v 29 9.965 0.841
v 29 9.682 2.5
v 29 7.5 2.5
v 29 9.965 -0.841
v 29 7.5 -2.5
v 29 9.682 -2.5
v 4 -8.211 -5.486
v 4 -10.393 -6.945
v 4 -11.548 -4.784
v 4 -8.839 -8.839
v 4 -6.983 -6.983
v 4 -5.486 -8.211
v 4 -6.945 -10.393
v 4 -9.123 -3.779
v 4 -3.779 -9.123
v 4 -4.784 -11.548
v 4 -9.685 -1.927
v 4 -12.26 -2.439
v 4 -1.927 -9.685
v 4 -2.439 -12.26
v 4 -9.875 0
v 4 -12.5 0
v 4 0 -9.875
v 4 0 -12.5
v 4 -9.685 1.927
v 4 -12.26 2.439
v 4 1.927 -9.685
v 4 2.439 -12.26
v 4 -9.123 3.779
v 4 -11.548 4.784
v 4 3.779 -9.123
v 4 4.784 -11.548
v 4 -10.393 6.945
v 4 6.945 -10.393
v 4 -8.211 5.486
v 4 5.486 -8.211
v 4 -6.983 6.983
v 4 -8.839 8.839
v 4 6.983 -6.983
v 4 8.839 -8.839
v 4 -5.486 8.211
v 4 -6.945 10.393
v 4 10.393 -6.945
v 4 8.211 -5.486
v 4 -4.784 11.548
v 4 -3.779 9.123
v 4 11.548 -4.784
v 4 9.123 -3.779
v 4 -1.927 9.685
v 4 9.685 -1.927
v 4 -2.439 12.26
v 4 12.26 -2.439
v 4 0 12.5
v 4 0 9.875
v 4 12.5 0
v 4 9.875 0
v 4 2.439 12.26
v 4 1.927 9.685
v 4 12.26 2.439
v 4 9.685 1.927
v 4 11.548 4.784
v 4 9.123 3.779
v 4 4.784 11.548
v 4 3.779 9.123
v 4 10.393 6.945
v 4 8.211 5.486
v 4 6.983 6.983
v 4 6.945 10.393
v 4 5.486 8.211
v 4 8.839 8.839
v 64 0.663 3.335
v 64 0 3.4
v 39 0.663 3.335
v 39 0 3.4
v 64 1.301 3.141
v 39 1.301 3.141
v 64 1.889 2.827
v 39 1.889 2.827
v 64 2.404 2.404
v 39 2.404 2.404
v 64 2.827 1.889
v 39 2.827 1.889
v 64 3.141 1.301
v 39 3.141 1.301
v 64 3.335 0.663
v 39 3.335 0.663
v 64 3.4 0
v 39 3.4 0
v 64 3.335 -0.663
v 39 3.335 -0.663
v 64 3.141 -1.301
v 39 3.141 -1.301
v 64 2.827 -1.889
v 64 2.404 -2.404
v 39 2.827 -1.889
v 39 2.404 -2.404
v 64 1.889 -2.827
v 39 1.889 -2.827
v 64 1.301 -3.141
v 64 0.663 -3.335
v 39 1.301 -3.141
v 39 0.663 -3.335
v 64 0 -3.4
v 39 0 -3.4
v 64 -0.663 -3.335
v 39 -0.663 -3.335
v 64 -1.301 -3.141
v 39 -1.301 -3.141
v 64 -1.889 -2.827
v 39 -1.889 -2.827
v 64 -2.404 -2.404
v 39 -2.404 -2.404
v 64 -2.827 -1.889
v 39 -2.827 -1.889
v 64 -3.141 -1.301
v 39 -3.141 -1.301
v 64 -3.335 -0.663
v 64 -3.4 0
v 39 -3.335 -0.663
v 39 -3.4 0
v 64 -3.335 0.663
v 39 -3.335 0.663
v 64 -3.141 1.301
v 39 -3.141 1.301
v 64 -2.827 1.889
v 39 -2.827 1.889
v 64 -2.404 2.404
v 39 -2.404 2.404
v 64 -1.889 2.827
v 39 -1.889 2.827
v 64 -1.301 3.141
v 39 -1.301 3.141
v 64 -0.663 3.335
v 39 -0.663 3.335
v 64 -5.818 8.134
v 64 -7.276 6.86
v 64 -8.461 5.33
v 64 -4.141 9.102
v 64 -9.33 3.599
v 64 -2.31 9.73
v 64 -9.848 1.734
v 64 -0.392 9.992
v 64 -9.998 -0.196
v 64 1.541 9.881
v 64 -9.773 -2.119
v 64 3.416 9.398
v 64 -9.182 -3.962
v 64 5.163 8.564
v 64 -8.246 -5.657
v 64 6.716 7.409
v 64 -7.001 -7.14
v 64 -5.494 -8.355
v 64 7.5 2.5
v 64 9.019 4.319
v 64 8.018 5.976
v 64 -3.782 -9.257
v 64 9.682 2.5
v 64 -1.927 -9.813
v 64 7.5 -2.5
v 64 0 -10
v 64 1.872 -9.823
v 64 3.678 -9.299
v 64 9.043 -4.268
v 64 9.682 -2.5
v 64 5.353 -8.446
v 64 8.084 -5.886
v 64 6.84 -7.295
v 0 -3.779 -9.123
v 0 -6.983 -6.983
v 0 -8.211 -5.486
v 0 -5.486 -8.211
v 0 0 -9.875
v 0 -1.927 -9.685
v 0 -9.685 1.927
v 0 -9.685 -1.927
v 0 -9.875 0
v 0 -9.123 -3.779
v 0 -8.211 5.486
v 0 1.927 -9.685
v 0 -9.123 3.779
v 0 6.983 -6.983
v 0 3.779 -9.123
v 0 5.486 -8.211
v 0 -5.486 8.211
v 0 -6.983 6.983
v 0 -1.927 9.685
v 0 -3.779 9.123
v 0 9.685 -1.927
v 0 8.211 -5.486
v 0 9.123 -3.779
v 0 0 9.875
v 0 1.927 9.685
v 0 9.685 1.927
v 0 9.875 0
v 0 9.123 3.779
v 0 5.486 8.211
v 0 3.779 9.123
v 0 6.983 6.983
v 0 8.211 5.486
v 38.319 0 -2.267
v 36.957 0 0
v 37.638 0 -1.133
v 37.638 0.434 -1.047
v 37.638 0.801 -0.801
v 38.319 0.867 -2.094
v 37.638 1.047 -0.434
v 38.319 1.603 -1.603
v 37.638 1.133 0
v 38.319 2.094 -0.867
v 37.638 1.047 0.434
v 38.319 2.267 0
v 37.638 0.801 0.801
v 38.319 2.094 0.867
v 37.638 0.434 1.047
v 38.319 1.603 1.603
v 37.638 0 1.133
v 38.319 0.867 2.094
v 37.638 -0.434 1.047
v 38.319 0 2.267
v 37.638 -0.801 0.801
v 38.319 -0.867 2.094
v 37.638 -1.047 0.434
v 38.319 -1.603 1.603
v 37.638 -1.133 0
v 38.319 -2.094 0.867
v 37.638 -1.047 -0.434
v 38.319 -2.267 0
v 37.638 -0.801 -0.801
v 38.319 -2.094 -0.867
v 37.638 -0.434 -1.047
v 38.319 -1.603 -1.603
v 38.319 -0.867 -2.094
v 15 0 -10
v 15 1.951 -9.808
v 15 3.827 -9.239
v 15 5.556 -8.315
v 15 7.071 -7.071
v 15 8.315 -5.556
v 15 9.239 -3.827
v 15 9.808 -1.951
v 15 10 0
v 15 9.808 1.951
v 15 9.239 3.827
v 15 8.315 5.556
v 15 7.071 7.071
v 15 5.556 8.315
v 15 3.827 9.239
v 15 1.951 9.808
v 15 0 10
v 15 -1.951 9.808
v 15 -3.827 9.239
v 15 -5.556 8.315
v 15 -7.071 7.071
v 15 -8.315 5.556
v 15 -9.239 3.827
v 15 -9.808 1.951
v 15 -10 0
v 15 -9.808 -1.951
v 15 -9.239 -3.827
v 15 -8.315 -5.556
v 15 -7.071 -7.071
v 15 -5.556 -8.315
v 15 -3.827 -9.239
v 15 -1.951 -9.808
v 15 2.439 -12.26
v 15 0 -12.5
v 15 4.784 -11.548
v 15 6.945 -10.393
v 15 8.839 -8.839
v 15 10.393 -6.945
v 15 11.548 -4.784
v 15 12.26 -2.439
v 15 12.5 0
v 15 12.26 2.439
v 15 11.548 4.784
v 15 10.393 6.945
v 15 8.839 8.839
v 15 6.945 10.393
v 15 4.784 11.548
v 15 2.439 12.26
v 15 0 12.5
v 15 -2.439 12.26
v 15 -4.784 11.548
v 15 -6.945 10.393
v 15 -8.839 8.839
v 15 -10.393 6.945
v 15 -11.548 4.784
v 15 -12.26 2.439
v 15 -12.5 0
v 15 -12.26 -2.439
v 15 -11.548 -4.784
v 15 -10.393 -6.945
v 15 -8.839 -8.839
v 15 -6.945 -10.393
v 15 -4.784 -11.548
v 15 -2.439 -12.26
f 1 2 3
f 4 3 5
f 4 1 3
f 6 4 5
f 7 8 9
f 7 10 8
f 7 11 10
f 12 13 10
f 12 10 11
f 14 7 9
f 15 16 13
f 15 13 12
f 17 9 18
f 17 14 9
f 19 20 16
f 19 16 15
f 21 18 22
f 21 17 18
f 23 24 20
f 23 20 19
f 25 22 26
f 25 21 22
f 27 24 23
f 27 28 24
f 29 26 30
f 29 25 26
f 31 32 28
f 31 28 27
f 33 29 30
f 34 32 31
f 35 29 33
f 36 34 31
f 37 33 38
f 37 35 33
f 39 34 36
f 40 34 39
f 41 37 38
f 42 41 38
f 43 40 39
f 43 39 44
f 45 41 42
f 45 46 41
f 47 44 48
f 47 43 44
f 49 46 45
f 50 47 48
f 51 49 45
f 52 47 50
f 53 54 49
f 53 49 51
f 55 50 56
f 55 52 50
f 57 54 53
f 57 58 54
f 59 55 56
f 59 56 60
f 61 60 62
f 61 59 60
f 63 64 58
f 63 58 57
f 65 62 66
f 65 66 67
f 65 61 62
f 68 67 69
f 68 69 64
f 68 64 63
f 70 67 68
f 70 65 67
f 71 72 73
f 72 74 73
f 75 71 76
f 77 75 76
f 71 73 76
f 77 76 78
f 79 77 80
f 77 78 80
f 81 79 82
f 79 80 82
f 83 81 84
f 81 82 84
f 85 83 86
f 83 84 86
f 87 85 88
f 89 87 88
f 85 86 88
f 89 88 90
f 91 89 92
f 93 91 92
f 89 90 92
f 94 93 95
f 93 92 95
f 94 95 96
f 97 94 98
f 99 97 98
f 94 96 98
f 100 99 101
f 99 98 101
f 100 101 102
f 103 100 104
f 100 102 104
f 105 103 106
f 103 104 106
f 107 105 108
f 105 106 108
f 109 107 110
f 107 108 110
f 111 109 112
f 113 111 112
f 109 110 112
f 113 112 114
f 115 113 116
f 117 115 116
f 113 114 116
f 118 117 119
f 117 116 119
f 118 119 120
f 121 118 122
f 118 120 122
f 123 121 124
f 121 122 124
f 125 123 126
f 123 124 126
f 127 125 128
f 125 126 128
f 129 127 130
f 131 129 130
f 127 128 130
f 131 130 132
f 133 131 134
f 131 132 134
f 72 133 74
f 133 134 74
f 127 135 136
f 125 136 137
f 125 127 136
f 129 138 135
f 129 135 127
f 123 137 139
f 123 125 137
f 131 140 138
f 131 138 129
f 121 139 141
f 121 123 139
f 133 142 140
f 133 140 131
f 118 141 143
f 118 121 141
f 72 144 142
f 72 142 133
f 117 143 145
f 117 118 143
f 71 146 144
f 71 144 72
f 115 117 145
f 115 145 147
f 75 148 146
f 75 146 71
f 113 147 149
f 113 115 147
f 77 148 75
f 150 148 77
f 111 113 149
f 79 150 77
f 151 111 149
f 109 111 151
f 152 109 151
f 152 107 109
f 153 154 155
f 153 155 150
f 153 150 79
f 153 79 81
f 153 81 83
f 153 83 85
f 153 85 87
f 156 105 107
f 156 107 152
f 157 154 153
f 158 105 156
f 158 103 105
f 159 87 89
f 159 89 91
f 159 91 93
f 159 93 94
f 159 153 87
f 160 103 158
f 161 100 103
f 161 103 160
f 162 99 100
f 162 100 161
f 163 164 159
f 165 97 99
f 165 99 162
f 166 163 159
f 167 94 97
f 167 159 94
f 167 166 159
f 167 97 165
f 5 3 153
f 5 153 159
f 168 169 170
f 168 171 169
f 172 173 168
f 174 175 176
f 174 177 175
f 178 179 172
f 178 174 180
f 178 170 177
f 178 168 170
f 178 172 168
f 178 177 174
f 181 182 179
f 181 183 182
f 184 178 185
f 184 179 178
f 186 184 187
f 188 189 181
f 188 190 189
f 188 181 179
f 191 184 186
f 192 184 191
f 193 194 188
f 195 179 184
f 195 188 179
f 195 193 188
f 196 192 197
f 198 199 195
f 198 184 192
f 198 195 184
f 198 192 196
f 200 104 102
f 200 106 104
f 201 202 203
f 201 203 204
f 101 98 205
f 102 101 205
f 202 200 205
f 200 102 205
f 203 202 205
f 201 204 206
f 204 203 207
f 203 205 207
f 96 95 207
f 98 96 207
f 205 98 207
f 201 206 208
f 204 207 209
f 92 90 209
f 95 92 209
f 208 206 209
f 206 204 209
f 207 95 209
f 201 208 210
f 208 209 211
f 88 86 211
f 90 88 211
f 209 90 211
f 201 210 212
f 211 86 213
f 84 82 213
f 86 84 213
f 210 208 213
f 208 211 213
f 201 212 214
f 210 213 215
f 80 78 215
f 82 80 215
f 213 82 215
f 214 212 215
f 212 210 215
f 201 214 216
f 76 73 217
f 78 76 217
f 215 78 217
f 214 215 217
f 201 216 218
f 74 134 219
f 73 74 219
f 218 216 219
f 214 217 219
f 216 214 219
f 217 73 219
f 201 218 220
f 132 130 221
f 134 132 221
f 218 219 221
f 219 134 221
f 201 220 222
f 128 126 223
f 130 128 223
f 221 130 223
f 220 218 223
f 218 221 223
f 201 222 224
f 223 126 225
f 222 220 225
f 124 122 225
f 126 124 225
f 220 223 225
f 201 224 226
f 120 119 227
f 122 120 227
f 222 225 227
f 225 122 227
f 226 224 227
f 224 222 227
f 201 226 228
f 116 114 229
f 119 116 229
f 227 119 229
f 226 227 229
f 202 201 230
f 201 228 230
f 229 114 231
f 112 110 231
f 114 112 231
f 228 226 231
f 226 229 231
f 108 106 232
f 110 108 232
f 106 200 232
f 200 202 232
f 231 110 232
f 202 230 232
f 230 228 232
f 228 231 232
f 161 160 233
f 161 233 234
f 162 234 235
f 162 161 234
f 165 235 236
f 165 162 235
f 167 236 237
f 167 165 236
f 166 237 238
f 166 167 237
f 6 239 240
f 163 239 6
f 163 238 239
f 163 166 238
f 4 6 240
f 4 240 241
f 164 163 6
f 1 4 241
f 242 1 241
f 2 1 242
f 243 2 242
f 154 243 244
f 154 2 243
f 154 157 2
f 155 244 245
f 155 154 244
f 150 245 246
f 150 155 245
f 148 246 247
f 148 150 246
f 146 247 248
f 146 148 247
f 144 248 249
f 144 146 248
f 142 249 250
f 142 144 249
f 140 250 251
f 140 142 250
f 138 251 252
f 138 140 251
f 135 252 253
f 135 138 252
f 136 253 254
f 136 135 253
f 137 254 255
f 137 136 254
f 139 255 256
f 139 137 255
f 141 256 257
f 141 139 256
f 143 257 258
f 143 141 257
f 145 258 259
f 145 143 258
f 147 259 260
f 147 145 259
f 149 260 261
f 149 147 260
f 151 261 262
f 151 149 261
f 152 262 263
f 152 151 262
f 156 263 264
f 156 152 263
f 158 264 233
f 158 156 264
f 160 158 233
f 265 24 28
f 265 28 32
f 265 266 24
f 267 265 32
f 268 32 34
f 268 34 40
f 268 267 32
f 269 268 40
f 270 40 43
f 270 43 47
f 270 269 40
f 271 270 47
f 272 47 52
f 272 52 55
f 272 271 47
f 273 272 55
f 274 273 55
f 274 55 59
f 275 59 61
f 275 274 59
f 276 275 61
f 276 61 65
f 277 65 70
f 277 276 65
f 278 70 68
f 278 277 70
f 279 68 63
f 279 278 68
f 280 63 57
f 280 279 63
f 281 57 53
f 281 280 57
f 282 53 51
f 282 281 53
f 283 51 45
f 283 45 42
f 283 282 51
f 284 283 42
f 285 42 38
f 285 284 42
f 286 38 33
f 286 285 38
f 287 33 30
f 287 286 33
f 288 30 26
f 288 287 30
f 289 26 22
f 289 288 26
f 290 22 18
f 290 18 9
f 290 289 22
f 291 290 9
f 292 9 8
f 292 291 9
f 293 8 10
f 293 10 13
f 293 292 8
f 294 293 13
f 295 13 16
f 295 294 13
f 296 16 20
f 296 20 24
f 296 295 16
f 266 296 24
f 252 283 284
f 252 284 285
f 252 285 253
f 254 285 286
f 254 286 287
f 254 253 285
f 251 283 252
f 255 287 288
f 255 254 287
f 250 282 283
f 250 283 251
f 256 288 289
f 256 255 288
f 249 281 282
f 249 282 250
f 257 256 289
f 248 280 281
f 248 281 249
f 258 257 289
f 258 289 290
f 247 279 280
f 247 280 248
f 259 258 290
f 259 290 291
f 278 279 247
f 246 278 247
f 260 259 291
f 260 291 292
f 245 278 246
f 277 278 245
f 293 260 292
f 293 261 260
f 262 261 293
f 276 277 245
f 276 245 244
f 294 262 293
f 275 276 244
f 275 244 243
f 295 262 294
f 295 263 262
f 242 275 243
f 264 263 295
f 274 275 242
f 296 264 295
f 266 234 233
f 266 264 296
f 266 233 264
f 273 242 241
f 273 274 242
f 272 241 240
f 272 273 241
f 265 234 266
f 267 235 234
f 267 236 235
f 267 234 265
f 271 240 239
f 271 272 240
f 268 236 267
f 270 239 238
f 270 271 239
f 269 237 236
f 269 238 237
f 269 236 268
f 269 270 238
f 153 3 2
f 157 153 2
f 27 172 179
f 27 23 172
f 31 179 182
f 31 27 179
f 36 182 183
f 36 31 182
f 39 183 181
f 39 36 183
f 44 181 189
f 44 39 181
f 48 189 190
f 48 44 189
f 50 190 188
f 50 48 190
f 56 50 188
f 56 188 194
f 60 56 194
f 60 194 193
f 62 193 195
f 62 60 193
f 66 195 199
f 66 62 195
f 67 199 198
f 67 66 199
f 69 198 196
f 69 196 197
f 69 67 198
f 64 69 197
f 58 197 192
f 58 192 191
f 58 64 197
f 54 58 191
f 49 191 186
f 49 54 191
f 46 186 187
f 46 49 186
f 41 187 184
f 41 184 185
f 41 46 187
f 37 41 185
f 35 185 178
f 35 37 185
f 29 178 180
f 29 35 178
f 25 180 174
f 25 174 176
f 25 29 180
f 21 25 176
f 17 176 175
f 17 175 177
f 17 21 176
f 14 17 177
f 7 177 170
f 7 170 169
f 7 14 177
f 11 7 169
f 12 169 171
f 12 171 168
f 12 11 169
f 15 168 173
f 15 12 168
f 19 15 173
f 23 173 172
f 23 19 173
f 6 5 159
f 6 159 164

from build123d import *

# Parameters (mm, degrees)
CUT_EXTRUDE_START     = -35
SKETCH_2_W            = 5
SKETCH_2_H            = 5
CUT_EXTRUDE_1_DEPTH   = 35
HOLE_WIZARD_M81_D     = 6.8
HOLE_WIZARD_M81_DEPTH = 25
HOLE_WIZARD_M81_TIP   = 2.042926105


with BuildPart() as part:
    # Эскиз1 → Повернуть1 (revolve)
    with BuildSketch(Plane(origin=(0, 0, 0), x_dir=(1, 0, 0), z_dir=(0, 1, 0))):
        Polygon((0, 0), (0, 9.875), (4, 9.875), (4, 12.5), (15, 12.5), (15, 10), (64, 10), (64, 0), align=None)
    revolve(axis=Axis((-1000, 0, 0), (1, 0, 0)))

    # Эскиз2 → Вырез-Вытянуть1 (cut)
    with BuildSketch(Plane(origin=(64, 0, 0), x_dir=(0, 0, -1), z_dir=(1, 0, 0)).offset(CUT_EXTRUDE_START)):
        with Locations((0, 10)):
            Rectangle(SKETCH_2_W, SKETCH_2_H)
    extrude(amount=CUT_EXTRUDE_1_DEPTH, mode=Mode.SUBTRACT)

    # Отверстие обработанное метчиком M81
    with Locations(Plane(origin=(64, 0, 0), x_dir=(0, 0, -1), z_dir=(1, 0, 0))):
        with Locations((0, 0)):
            Hole(HOLE_WIZARD_M81_D / 2, depth=HOLE_WIZARD_M81_DEPTH)
            with Locations((0, 0, -(HOLE_WIZARD_M81_DEPTH + HOLE_WIZARD_M81_TIP / 2))):  # 118° drill point
                Cone(0, HOLE_WIZARD_M81_D / 2, HOLE_WIZARD_M81_TIP, mode=Mode.SUBTRACT)


solid = part.part
